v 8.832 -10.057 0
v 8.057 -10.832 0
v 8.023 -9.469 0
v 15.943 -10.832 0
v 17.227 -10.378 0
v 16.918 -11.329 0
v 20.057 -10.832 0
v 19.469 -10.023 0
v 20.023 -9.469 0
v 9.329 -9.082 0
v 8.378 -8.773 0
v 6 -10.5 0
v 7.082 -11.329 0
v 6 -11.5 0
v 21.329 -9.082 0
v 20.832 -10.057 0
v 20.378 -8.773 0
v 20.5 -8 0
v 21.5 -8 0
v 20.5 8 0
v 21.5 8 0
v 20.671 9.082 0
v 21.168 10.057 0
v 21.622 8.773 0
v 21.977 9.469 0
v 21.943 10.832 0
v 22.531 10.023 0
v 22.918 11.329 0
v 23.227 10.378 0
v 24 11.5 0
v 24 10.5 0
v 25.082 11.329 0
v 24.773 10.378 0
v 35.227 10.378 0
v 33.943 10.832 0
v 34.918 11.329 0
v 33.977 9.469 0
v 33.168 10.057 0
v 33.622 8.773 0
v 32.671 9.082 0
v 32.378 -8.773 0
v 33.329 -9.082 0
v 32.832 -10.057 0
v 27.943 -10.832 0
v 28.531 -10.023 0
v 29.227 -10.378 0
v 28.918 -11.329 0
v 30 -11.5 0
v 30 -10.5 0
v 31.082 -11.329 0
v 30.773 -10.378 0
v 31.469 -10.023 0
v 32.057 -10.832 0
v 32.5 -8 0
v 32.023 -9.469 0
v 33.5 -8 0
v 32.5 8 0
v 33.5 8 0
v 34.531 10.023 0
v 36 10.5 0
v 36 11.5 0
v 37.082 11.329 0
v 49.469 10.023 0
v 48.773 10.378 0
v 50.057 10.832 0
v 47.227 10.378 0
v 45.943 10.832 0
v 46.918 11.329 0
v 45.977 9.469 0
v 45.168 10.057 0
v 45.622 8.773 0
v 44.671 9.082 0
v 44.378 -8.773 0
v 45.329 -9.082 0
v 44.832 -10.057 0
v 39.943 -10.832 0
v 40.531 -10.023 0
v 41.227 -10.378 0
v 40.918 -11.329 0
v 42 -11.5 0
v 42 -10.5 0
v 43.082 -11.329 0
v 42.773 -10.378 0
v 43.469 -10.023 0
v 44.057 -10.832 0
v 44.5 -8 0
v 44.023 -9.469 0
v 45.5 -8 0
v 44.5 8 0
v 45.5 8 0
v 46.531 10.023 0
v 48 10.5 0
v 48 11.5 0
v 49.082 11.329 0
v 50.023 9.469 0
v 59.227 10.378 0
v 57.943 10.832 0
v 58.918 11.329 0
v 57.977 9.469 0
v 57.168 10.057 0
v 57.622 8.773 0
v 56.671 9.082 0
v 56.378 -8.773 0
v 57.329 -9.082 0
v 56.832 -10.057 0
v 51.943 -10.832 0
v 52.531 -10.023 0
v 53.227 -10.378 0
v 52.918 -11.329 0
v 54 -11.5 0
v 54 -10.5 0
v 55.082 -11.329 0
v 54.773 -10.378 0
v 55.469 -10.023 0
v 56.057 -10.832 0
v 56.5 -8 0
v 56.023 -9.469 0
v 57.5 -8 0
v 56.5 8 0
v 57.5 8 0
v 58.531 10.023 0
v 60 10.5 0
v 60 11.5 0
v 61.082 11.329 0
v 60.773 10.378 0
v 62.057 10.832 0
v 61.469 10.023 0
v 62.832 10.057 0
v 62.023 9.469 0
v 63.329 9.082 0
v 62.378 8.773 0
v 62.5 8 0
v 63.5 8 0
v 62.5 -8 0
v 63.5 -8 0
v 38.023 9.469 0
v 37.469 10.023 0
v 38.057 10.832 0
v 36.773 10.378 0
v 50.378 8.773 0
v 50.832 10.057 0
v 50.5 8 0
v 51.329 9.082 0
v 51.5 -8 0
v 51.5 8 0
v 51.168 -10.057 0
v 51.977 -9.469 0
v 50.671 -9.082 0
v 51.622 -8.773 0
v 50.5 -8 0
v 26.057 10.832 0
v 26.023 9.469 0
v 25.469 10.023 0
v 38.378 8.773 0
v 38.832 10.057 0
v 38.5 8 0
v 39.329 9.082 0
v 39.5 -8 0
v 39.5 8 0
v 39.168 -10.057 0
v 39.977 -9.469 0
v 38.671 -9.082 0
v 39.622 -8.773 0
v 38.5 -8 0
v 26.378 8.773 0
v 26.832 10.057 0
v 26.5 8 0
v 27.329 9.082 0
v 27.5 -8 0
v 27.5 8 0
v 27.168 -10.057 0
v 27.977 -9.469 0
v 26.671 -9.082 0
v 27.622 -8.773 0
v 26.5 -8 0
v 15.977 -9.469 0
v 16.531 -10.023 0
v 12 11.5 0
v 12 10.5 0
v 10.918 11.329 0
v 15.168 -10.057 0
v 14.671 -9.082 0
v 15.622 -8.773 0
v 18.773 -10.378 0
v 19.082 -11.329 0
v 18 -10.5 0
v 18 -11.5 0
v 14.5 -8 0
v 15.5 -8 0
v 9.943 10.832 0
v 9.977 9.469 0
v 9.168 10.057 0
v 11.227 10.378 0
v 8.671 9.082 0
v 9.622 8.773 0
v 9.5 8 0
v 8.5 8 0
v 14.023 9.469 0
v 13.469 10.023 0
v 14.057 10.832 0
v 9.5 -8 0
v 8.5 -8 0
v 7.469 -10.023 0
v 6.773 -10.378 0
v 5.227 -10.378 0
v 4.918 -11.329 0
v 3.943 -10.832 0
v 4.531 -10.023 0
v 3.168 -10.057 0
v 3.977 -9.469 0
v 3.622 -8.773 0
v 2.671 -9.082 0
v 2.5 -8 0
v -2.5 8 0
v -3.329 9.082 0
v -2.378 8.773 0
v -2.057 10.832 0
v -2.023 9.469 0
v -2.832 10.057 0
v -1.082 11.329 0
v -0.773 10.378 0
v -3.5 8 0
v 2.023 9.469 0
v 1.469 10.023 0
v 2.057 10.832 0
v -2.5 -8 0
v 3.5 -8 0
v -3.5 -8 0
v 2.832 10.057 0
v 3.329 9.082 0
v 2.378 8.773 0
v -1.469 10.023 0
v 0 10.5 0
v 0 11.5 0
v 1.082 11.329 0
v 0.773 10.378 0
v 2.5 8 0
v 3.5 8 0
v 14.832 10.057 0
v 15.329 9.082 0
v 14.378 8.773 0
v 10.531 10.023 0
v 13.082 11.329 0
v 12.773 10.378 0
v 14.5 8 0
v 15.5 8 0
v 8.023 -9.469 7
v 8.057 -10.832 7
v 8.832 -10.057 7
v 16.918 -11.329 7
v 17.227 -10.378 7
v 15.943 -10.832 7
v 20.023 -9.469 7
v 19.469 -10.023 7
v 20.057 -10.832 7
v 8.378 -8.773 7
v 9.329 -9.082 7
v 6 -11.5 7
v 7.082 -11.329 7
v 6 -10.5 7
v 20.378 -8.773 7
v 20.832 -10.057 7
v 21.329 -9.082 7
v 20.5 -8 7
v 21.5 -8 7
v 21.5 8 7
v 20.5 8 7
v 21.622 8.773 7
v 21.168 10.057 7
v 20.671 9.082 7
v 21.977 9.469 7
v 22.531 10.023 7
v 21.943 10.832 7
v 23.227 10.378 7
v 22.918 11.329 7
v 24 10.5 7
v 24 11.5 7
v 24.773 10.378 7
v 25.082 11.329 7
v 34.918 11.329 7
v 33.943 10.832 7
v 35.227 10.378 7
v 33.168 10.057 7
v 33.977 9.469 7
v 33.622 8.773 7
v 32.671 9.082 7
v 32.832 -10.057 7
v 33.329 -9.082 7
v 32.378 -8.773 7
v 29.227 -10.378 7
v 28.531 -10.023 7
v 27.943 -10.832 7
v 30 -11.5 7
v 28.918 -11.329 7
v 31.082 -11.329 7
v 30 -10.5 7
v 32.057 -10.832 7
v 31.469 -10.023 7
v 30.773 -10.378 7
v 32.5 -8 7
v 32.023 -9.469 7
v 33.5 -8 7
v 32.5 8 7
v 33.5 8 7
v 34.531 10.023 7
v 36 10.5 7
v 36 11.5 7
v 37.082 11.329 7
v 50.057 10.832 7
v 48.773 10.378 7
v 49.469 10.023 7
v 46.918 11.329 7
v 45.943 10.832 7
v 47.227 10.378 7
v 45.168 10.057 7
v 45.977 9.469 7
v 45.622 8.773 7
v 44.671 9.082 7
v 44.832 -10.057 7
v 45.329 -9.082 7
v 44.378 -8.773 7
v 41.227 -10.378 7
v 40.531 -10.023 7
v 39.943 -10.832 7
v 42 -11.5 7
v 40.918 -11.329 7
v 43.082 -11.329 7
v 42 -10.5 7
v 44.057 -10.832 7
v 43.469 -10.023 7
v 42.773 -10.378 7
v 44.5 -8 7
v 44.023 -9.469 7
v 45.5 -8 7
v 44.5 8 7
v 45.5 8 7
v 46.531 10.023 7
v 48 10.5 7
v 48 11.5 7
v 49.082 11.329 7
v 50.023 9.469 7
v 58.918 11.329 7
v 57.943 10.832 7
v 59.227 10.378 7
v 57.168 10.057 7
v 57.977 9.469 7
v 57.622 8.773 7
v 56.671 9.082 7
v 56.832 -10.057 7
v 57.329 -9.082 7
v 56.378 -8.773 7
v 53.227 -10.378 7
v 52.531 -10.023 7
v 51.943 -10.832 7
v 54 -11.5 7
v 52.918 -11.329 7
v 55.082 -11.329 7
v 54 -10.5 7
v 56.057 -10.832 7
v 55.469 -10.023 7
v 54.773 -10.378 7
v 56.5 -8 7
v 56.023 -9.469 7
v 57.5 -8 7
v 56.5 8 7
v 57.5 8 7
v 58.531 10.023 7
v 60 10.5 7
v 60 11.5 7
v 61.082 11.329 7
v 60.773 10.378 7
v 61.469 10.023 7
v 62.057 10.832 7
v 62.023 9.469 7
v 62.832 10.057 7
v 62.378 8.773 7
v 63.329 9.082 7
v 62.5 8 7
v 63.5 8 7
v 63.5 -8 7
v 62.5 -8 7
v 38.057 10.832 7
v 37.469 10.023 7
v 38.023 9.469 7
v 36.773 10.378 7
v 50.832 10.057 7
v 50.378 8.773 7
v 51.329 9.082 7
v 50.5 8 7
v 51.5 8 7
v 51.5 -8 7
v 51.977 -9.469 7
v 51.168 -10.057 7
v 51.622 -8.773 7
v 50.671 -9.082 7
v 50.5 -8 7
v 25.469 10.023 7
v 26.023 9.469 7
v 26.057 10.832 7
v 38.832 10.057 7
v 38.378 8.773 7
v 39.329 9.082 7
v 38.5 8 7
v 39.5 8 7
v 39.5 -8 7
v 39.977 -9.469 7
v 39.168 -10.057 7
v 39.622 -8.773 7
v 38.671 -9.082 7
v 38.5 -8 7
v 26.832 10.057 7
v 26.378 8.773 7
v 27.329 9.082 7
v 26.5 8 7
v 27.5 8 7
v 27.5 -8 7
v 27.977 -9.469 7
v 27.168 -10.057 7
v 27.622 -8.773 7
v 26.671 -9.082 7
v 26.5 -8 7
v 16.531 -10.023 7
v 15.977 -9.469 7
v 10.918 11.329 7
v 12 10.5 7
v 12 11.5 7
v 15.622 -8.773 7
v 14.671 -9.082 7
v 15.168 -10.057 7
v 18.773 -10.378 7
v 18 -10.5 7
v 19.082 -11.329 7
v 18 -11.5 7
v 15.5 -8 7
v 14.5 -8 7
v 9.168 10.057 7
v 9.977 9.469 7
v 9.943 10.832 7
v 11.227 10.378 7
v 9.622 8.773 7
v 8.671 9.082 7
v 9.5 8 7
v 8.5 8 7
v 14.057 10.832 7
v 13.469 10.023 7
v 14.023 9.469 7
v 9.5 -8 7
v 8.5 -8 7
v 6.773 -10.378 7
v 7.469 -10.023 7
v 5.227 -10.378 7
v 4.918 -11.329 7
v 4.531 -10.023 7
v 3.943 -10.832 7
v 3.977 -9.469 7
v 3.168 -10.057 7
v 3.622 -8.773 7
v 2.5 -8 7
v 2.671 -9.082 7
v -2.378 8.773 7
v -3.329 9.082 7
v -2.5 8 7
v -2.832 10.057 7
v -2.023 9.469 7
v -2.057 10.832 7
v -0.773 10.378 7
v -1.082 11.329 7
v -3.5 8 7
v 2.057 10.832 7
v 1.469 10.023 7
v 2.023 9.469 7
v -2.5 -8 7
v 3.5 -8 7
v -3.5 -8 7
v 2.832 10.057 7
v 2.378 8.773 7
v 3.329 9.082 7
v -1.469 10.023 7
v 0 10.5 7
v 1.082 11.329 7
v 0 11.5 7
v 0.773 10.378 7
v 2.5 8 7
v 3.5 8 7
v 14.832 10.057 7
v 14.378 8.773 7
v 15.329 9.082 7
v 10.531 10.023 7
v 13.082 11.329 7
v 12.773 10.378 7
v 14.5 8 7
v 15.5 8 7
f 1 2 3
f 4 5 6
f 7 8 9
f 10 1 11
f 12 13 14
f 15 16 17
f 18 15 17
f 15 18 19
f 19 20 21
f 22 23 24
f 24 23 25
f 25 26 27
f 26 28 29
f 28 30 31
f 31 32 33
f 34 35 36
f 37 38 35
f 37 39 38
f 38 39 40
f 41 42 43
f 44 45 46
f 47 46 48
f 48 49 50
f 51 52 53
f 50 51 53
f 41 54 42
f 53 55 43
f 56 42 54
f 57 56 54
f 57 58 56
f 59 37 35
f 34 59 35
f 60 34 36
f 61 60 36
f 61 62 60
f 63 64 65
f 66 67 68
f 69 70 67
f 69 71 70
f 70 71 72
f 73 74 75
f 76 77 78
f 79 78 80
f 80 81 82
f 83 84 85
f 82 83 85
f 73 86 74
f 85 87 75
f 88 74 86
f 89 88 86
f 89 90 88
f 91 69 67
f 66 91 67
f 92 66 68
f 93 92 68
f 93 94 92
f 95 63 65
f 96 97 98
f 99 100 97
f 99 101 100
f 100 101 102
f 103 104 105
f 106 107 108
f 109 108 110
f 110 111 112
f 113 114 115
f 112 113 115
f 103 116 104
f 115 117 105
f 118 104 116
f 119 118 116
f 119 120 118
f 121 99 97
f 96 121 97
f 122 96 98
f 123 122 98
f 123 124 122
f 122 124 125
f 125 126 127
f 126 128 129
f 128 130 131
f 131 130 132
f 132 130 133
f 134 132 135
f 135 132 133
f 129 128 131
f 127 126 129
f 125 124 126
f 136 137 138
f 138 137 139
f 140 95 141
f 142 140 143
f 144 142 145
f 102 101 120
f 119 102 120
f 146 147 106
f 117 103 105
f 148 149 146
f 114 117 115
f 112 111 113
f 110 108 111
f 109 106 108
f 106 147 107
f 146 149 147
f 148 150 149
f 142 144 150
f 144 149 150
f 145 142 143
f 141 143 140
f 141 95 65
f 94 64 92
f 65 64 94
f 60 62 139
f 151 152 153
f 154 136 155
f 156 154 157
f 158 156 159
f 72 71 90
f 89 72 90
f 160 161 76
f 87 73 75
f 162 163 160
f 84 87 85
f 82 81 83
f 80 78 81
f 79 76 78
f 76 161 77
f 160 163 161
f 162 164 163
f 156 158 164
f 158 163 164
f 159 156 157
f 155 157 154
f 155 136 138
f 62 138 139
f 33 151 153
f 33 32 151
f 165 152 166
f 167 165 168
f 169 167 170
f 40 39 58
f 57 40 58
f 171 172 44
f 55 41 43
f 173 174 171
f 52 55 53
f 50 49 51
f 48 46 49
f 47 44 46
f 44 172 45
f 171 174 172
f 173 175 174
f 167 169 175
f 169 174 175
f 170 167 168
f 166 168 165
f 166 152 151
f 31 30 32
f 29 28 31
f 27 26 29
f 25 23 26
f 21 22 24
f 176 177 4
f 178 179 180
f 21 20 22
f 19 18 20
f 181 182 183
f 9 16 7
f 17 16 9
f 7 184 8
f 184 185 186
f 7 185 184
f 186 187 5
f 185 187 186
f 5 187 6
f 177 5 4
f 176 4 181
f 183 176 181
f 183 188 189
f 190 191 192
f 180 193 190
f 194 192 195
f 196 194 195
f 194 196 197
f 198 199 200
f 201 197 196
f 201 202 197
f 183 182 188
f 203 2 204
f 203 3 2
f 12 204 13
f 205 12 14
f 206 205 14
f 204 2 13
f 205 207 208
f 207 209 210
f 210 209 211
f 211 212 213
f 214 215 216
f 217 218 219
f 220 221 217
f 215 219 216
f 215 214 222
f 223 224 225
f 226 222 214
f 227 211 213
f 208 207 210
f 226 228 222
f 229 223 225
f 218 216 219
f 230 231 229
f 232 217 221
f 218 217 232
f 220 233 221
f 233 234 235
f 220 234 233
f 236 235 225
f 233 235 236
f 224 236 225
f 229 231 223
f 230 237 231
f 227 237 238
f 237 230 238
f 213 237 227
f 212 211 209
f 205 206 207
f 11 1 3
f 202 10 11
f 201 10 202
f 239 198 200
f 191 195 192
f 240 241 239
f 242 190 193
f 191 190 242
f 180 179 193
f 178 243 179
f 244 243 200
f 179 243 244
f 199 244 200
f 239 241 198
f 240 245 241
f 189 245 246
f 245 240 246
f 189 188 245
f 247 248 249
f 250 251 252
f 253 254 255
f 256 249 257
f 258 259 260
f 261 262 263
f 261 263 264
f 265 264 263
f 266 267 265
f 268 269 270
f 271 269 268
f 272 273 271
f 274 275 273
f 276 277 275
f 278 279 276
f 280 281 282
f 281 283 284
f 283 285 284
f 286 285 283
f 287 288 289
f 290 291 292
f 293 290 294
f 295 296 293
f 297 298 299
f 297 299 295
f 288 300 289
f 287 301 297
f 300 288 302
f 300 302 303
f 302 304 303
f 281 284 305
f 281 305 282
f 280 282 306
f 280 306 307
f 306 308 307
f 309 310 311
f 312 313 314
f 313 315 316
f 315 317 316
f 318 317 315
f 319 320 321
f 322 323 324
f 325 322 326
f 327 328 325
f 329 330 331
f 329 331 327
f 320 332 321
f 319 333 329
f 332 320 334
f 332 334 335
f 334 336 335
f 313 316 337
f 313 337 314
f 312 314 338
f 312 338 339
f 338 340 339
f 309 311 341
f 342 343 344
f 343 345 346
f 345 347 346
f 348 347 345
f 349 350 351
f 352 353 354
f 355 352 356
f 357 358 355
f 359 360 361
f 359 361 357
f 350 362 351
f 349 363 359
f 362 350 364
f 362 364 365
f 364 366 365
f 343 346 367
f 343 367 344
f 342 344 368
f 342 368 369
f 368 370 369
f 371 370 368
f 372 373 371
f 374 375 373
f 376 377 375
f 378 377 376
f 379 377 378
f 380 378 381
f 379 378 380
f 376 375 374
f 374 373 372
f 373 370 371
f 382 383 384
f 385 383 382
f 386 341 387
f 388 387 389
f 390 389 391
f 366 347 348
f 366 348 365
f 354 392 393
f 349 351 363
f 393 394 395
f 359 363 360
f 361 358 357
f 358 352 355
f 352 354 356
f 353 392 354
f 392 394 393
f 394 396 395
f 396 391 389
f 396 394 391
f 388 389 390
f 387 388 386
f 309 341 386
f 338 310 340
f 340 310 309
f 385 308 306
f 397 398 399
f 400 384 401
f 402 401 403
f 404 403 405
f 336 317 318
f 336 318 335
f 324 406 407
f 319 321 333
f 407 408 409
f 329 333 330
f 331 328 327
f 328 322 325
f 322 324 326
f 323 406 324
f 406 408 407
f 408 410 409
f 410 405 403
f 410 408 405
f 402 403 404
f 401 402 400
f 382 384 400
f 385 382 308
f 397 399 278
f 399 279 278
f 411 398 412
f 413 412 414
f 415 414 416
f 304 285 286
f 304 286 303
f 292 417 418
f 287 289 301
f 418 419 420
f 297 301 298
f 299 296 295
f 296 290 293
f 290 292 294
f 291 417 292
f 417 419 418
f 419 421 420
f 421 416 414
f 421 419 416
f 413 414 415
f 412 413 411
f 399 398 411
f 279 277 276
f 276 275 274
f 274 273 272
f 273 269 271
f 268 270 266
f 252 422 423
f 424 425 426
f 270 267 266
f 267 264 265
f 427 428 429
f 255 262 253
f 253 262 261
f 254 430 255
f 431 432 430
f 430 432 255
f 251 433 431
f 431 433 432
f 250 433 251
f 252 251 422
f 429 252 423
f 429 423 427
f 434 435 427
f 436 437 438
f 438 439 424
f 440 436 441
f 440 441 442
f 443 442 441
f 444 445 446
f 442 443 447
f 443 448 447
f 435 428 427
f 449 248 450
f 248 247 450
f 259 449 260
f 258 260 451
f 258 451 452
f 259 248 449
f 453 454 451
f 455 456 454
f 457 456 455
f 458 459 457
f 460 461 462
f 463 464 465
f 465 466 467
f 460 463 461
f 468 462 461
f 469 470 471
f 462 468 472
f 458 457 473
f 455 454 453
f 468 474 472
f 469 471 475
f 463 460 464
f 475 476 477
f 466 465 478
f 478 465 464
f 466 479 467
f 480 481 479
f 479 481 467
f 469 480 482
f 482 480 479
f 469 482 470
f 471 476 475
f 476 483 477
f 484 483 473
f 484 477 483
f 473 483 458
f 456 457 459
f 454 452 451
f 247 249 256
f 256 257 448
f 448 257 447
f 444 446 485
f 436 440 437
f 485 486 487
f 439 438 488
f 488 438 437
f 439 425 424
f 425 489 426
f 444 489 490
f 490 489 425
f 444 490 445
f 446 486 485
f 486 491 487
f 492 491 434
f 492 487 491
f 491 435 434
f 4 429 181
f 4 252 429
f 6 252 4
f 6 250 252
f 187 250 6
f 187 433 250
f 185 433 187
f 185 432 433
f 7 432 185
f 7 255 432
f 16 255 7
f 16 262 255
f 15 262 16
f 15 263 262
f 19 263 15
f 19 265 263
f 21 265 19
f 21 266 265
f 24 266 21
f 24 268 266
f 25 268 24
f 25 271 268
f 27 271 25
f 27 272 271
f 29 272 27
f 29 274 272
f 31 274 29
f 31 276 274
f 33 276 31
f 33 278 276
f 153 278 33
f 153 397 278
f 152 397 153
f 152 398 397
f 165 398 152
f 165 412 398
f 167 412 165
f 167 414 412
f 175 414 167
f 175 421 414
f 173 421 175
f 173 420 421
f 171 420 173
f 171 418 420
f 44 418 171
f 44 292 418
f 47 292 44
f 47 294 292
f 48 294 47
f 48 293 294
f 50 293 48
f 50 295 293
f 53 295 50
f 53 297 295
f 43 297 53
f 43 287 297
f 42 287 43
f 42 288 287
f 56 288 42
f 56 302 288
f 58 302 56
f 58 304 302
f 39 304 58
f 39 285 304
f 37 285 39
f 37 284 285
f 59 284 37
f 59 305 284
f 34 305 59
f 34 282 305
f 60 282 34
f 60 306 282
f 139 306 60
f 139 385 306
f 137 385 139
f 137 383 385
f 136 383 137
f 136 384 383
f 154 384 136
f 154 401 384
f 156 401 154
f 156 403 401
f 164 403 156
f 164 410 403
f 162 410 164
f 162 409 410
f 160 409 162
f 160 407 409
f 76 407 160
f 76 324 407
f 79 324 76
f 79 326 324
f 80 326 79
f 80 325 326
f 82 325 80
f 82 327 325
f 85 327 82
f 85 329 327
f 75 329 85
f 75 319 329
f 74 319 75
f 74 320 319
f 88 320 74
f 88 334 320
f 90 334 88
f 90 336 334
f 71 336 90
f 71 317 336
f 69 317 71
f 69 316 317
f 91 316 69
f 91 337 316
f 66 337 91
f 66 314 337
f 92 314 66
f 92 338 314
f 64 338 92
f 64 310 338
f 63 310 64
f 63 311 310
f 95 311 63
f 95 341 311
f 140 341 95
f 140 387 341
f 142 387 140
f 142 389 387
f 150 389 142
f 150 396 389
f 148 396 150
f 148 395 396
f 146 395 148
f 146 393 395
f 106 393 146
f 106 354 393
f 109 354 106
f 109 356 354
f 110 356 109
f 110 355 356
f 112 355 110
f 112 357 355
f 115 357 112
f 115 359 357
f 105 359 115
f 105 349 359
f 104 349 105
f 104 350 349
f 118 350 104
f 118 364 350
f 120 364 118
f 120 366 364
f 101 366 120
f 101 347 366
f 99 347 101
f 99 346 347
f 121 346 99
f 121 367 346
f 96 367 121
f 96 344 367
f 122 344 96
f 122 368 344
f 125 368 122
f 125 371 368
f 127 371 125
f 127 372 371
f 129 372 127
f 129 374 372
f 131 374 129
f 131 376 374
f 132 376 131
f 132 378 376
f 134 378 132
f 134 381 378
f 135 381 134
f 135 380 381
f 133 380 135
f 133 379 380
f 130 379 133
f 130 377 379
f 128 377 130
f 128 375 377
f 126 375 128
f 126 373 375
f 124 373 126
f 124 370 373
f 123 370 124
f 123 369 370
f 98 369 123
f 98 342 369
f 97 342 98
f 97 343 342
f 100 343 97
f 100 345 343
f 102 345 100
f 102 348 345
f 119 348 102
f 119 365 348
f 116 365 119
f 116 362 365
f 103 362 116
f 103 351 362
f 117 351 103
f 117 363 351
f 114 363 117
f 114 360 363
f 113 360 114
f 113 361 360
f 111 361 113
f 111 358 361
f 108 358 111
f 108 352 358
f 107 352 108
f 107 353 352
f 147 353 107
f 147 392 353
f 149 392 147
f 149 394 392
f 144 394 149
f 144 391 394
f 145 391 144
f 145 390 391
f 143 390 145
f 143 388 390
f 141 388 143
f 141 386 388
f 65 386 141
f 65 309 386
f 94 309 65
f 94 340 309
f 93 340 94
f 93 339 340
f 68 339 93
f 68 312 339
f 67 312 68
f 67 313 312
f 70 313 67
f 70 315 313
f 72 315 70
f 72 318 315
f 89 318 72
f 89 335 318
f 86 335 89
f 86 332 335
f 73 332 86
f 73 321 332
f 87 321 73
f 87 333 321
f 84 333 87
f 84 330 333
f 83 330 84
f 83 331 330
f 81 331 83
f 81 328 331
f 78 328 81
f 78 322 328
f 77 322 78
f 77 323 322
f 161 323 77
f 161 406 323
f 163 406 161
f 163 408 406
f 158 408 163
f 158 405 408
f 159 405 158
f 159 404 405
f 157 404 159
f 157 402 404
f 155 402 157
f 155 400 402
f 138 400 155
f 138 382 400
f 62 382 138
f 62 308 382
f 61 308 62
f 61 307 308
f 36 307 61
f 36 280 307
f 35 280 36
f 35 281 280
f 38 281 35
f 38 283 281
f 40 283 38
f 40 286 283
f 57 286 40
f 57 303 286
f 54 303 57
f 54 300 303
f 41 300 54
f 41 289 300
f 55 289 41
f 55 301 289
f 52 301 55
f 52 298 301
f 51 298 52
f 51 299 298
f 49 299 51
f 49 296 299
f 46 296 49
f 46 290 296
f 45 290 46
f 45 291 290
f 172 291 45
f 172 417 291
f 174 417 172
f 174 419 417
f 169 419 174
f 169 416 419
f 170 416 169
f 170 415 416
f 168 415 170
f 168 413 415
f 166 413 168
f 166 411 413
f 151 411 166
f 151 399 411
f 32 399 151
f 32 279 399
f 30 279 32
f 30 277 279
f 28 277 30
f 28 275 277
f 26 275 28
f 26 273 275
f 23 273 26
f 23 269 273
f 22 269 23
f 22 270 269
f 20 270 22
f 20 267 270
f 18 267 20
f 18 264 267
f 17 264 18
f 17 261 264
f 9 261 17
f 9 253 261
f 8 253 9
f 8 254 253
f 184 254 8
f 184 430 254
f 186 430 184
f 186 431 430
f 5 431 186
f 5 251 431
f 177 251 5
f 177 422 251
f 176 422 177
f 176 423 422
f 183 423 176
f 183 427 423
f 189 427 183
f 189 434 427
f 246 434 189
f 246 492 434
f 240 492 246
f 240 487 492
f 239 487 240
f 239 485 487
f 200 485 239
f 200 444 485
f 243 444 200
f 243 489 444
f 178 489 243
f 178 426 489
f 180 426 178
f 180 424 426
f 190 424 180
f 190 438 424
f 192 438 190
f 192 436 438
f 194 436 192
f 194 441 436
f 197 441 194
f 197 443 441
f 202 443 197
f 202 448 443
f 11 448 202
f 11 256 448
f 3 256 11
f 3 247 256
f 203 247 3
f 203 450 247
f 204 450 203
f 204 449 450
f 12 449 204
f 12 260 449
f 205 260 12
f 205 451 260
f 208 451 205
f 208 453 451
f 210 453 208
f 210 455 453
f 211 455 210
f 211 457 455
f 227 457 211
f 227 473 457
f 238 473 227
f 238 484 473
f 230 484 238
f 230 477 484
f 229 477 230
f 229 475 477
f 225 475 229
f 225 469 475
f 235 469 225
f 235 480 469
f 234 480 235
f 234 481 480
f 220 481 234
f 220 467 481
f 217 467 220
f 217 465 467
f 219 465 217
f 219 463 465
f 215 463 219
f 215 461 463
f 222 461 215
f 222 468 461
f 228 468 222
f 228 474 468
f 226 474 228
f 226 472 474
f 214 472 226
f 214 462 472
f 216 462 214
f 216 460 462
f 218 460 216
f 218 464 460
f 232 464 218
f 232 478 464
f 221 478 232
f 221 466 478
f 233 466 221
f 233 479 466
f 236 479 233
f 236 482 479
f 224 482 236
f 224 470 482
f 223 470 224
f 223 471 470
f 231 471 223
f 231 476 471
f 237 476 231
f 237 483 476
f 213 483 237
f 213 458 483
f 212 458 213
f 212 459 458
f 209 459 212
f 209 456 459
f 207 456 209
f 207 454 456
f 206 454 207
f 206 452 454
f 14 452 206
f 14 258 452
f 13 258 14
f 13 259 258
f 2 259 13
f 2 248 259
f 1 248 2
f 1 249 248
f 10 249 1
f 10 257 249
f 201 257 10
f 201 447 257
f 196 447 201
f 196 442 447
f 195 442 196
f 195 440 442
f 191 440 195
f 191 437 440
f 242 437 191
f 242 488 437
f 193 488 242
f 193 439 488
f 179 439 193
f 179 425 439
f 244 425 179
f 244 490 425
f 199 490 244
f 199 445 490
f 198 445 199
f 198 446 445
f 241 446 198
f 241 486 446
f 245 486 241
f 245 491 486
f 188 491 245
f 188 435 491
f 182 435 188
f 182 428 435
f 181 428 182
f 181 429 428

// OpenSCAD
// Inner radius of the loops
innerRadius = 5;

// Outer radius of the loops
outerRadius = 7;

// Width of the entire spring
width=30;

// Number of loop pairs
loops=5;

// Height of the spring
height=7;

// Number of segments in curves
$fn=20;

linear_extrude(height)
difference()
{
    union()
    {
        for(i=[0:loops])
        {
            translate([i*(outerRadius-(outerRadius-innerRadius)/2)*2,0,0])
            {
                square([outerRadius,width-outerRadius*2],center=true);
                translate([0,width/2-outerRadius,0])
                    circle(d=outerRadius);
                translate([outerRadius-(outerRadius-innerRadius)/2,-(width/2-outerRadius),0])
                    circle(d=outerRadius);
            }
        }
    }
    union()
    {
        for(i=[0:loops])
        {
            translate([i*(outerRadius-(outerRadius-innerRadius)/2)*2,0,0])
            {
                square([innerRadius,width-outerRadius*2],center=true);
                translate([0,width/2-outerRadius,0])
                    circle(d=innerRadius);
                translate([outerRadius-(outerRadius-innerRadius)/2,-(width/2-outerRadius),0])
                    circle(d=innerRadius);
                translate([outerRadius-(outerRadius-innerRadius)/2,0,0])
                    square([innerRadius,width-outerRadius*2],center=true);
            }
        }
        translate([loops*(outerRadius-(outerRadius-innerRadius)/2)*2,0,0])
        {
            translate([outerRadius,0,0])
                square([outerRadius,width],center=true);
            translate([outerRadius-(outerRadius-innerRadius)/2,-width+outerRadius,0])
                square([outerRadius,width],center=true);
        }
    }
}
